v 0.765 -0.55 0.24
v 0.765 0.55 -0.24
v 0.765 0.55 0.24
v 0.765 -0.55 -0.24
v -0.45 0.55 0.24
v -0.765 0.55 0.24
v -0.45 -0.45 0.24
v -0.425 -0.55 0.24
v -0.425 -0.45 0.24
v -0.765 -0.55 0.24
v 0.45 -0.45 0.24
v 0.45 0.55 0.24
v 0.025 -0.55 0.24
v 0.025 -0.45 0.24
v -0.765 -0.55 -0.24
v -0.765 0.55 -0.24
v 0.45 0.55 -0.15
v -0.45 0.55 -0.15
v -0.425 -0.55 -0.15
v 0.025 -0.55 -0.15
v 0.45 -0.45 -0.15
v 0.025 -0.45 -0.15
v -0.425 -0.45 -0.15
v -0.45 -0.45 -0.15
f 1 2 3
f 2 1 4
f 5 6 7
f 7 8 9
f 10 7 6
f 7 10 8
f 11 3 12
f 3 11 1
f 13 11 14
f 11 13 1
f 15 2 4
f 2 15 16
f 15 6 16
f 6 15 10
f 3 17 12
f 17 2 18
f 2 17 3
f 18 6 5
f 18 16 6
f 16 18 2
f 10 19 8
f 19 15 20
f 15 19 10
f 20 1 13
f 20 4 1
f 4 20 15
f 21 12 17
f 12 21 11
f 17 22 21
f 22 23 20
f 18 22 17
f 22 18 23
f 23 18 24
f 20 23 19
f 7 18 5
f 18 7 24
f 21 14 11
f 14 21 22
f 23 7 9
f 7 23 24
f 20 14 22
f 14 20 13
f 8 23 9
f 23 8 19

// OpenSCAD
// Generated by SolidPython 1.1.3 on 2024-01-15 09:28:27
$fn = 48;


union() {
	difference() {
		difference() {
			scale(v = [1.7000000000, 1.1000000000, 1.2000000000]) {
				cube(center = true, size = [0.9000000000, 1.0000000000, 0.4000000000]);
			}
			translate(v = [0, 0.5500000000, 0.0500000000]) {
				scale(v = [1, 2, 1]) {
					cube(center = true, size = [0.9000000000, 1.0000000000, 0.4000000000]);
				}
			}
		}
		translate(v = [-0.2000000000, 0.0000000000, 0.0500000000]) {
			scale(v = [0.5000000000, 2, 1]) {
				cube(center = true, size = [0.9000000000, 1.0000000000, 0.4000000000]);
			}
		}
	}
}
/***********************************************
*********      SolidPython code:      **********
************************************************
 
#! /usr/bin/env python3
import sys
import numpy as np
from solid import *
from solid.objects import cube, translate, union, rotate, color, cylinder

SEGMENTS = 48
SERVO_WIDTH = .9
SERVO_HEIGHT = .4
SERVO_DEPTH = 1.


def eyeGenerator():

    holder = cube([SERVO_WIDTH+1, SERVO_DEPTH, SERVO_HEIGHT], center=True)
    servo = cube([SERVO_WIDTH, SERVO_DEPTH, SERVO_HEIGHT], center=True)
    servoHolder = scale([1.7, 1.1, 1.2])(servo)
    servoDiff = translate([0, .55, .05])(scale([1, 2, 1])(servo))
    neckPiece = difference()(servoHolder, servoDiff)
    servoTopDiff = translate([-.2, .0, .05])(scale([.5, 2, 1])(servo))
    neckPiece = difference()(neckPiece, servoTopDiff)

    return union()(neckPiece)


if __name__ == '__main__':
    out_dir = sys.argv[1] if len(sys.argv) > 1 else None

    a = eyeGenerator()

    # Adding the file_header argument as shown allows you to change
    # the detail of arcs by changing the SEGMENTS variable.  This can
    # be expensive when making lots of small curves, but is otherwise
    # useful.
    file_out = scad_render_to_file(
        a, out_dir=out_dir, file_header=f'$fn = {SEGMENTS};')
    print(f"{__file__}: SCAD file written to: \n{file_out}")
 
 
************************************************/
